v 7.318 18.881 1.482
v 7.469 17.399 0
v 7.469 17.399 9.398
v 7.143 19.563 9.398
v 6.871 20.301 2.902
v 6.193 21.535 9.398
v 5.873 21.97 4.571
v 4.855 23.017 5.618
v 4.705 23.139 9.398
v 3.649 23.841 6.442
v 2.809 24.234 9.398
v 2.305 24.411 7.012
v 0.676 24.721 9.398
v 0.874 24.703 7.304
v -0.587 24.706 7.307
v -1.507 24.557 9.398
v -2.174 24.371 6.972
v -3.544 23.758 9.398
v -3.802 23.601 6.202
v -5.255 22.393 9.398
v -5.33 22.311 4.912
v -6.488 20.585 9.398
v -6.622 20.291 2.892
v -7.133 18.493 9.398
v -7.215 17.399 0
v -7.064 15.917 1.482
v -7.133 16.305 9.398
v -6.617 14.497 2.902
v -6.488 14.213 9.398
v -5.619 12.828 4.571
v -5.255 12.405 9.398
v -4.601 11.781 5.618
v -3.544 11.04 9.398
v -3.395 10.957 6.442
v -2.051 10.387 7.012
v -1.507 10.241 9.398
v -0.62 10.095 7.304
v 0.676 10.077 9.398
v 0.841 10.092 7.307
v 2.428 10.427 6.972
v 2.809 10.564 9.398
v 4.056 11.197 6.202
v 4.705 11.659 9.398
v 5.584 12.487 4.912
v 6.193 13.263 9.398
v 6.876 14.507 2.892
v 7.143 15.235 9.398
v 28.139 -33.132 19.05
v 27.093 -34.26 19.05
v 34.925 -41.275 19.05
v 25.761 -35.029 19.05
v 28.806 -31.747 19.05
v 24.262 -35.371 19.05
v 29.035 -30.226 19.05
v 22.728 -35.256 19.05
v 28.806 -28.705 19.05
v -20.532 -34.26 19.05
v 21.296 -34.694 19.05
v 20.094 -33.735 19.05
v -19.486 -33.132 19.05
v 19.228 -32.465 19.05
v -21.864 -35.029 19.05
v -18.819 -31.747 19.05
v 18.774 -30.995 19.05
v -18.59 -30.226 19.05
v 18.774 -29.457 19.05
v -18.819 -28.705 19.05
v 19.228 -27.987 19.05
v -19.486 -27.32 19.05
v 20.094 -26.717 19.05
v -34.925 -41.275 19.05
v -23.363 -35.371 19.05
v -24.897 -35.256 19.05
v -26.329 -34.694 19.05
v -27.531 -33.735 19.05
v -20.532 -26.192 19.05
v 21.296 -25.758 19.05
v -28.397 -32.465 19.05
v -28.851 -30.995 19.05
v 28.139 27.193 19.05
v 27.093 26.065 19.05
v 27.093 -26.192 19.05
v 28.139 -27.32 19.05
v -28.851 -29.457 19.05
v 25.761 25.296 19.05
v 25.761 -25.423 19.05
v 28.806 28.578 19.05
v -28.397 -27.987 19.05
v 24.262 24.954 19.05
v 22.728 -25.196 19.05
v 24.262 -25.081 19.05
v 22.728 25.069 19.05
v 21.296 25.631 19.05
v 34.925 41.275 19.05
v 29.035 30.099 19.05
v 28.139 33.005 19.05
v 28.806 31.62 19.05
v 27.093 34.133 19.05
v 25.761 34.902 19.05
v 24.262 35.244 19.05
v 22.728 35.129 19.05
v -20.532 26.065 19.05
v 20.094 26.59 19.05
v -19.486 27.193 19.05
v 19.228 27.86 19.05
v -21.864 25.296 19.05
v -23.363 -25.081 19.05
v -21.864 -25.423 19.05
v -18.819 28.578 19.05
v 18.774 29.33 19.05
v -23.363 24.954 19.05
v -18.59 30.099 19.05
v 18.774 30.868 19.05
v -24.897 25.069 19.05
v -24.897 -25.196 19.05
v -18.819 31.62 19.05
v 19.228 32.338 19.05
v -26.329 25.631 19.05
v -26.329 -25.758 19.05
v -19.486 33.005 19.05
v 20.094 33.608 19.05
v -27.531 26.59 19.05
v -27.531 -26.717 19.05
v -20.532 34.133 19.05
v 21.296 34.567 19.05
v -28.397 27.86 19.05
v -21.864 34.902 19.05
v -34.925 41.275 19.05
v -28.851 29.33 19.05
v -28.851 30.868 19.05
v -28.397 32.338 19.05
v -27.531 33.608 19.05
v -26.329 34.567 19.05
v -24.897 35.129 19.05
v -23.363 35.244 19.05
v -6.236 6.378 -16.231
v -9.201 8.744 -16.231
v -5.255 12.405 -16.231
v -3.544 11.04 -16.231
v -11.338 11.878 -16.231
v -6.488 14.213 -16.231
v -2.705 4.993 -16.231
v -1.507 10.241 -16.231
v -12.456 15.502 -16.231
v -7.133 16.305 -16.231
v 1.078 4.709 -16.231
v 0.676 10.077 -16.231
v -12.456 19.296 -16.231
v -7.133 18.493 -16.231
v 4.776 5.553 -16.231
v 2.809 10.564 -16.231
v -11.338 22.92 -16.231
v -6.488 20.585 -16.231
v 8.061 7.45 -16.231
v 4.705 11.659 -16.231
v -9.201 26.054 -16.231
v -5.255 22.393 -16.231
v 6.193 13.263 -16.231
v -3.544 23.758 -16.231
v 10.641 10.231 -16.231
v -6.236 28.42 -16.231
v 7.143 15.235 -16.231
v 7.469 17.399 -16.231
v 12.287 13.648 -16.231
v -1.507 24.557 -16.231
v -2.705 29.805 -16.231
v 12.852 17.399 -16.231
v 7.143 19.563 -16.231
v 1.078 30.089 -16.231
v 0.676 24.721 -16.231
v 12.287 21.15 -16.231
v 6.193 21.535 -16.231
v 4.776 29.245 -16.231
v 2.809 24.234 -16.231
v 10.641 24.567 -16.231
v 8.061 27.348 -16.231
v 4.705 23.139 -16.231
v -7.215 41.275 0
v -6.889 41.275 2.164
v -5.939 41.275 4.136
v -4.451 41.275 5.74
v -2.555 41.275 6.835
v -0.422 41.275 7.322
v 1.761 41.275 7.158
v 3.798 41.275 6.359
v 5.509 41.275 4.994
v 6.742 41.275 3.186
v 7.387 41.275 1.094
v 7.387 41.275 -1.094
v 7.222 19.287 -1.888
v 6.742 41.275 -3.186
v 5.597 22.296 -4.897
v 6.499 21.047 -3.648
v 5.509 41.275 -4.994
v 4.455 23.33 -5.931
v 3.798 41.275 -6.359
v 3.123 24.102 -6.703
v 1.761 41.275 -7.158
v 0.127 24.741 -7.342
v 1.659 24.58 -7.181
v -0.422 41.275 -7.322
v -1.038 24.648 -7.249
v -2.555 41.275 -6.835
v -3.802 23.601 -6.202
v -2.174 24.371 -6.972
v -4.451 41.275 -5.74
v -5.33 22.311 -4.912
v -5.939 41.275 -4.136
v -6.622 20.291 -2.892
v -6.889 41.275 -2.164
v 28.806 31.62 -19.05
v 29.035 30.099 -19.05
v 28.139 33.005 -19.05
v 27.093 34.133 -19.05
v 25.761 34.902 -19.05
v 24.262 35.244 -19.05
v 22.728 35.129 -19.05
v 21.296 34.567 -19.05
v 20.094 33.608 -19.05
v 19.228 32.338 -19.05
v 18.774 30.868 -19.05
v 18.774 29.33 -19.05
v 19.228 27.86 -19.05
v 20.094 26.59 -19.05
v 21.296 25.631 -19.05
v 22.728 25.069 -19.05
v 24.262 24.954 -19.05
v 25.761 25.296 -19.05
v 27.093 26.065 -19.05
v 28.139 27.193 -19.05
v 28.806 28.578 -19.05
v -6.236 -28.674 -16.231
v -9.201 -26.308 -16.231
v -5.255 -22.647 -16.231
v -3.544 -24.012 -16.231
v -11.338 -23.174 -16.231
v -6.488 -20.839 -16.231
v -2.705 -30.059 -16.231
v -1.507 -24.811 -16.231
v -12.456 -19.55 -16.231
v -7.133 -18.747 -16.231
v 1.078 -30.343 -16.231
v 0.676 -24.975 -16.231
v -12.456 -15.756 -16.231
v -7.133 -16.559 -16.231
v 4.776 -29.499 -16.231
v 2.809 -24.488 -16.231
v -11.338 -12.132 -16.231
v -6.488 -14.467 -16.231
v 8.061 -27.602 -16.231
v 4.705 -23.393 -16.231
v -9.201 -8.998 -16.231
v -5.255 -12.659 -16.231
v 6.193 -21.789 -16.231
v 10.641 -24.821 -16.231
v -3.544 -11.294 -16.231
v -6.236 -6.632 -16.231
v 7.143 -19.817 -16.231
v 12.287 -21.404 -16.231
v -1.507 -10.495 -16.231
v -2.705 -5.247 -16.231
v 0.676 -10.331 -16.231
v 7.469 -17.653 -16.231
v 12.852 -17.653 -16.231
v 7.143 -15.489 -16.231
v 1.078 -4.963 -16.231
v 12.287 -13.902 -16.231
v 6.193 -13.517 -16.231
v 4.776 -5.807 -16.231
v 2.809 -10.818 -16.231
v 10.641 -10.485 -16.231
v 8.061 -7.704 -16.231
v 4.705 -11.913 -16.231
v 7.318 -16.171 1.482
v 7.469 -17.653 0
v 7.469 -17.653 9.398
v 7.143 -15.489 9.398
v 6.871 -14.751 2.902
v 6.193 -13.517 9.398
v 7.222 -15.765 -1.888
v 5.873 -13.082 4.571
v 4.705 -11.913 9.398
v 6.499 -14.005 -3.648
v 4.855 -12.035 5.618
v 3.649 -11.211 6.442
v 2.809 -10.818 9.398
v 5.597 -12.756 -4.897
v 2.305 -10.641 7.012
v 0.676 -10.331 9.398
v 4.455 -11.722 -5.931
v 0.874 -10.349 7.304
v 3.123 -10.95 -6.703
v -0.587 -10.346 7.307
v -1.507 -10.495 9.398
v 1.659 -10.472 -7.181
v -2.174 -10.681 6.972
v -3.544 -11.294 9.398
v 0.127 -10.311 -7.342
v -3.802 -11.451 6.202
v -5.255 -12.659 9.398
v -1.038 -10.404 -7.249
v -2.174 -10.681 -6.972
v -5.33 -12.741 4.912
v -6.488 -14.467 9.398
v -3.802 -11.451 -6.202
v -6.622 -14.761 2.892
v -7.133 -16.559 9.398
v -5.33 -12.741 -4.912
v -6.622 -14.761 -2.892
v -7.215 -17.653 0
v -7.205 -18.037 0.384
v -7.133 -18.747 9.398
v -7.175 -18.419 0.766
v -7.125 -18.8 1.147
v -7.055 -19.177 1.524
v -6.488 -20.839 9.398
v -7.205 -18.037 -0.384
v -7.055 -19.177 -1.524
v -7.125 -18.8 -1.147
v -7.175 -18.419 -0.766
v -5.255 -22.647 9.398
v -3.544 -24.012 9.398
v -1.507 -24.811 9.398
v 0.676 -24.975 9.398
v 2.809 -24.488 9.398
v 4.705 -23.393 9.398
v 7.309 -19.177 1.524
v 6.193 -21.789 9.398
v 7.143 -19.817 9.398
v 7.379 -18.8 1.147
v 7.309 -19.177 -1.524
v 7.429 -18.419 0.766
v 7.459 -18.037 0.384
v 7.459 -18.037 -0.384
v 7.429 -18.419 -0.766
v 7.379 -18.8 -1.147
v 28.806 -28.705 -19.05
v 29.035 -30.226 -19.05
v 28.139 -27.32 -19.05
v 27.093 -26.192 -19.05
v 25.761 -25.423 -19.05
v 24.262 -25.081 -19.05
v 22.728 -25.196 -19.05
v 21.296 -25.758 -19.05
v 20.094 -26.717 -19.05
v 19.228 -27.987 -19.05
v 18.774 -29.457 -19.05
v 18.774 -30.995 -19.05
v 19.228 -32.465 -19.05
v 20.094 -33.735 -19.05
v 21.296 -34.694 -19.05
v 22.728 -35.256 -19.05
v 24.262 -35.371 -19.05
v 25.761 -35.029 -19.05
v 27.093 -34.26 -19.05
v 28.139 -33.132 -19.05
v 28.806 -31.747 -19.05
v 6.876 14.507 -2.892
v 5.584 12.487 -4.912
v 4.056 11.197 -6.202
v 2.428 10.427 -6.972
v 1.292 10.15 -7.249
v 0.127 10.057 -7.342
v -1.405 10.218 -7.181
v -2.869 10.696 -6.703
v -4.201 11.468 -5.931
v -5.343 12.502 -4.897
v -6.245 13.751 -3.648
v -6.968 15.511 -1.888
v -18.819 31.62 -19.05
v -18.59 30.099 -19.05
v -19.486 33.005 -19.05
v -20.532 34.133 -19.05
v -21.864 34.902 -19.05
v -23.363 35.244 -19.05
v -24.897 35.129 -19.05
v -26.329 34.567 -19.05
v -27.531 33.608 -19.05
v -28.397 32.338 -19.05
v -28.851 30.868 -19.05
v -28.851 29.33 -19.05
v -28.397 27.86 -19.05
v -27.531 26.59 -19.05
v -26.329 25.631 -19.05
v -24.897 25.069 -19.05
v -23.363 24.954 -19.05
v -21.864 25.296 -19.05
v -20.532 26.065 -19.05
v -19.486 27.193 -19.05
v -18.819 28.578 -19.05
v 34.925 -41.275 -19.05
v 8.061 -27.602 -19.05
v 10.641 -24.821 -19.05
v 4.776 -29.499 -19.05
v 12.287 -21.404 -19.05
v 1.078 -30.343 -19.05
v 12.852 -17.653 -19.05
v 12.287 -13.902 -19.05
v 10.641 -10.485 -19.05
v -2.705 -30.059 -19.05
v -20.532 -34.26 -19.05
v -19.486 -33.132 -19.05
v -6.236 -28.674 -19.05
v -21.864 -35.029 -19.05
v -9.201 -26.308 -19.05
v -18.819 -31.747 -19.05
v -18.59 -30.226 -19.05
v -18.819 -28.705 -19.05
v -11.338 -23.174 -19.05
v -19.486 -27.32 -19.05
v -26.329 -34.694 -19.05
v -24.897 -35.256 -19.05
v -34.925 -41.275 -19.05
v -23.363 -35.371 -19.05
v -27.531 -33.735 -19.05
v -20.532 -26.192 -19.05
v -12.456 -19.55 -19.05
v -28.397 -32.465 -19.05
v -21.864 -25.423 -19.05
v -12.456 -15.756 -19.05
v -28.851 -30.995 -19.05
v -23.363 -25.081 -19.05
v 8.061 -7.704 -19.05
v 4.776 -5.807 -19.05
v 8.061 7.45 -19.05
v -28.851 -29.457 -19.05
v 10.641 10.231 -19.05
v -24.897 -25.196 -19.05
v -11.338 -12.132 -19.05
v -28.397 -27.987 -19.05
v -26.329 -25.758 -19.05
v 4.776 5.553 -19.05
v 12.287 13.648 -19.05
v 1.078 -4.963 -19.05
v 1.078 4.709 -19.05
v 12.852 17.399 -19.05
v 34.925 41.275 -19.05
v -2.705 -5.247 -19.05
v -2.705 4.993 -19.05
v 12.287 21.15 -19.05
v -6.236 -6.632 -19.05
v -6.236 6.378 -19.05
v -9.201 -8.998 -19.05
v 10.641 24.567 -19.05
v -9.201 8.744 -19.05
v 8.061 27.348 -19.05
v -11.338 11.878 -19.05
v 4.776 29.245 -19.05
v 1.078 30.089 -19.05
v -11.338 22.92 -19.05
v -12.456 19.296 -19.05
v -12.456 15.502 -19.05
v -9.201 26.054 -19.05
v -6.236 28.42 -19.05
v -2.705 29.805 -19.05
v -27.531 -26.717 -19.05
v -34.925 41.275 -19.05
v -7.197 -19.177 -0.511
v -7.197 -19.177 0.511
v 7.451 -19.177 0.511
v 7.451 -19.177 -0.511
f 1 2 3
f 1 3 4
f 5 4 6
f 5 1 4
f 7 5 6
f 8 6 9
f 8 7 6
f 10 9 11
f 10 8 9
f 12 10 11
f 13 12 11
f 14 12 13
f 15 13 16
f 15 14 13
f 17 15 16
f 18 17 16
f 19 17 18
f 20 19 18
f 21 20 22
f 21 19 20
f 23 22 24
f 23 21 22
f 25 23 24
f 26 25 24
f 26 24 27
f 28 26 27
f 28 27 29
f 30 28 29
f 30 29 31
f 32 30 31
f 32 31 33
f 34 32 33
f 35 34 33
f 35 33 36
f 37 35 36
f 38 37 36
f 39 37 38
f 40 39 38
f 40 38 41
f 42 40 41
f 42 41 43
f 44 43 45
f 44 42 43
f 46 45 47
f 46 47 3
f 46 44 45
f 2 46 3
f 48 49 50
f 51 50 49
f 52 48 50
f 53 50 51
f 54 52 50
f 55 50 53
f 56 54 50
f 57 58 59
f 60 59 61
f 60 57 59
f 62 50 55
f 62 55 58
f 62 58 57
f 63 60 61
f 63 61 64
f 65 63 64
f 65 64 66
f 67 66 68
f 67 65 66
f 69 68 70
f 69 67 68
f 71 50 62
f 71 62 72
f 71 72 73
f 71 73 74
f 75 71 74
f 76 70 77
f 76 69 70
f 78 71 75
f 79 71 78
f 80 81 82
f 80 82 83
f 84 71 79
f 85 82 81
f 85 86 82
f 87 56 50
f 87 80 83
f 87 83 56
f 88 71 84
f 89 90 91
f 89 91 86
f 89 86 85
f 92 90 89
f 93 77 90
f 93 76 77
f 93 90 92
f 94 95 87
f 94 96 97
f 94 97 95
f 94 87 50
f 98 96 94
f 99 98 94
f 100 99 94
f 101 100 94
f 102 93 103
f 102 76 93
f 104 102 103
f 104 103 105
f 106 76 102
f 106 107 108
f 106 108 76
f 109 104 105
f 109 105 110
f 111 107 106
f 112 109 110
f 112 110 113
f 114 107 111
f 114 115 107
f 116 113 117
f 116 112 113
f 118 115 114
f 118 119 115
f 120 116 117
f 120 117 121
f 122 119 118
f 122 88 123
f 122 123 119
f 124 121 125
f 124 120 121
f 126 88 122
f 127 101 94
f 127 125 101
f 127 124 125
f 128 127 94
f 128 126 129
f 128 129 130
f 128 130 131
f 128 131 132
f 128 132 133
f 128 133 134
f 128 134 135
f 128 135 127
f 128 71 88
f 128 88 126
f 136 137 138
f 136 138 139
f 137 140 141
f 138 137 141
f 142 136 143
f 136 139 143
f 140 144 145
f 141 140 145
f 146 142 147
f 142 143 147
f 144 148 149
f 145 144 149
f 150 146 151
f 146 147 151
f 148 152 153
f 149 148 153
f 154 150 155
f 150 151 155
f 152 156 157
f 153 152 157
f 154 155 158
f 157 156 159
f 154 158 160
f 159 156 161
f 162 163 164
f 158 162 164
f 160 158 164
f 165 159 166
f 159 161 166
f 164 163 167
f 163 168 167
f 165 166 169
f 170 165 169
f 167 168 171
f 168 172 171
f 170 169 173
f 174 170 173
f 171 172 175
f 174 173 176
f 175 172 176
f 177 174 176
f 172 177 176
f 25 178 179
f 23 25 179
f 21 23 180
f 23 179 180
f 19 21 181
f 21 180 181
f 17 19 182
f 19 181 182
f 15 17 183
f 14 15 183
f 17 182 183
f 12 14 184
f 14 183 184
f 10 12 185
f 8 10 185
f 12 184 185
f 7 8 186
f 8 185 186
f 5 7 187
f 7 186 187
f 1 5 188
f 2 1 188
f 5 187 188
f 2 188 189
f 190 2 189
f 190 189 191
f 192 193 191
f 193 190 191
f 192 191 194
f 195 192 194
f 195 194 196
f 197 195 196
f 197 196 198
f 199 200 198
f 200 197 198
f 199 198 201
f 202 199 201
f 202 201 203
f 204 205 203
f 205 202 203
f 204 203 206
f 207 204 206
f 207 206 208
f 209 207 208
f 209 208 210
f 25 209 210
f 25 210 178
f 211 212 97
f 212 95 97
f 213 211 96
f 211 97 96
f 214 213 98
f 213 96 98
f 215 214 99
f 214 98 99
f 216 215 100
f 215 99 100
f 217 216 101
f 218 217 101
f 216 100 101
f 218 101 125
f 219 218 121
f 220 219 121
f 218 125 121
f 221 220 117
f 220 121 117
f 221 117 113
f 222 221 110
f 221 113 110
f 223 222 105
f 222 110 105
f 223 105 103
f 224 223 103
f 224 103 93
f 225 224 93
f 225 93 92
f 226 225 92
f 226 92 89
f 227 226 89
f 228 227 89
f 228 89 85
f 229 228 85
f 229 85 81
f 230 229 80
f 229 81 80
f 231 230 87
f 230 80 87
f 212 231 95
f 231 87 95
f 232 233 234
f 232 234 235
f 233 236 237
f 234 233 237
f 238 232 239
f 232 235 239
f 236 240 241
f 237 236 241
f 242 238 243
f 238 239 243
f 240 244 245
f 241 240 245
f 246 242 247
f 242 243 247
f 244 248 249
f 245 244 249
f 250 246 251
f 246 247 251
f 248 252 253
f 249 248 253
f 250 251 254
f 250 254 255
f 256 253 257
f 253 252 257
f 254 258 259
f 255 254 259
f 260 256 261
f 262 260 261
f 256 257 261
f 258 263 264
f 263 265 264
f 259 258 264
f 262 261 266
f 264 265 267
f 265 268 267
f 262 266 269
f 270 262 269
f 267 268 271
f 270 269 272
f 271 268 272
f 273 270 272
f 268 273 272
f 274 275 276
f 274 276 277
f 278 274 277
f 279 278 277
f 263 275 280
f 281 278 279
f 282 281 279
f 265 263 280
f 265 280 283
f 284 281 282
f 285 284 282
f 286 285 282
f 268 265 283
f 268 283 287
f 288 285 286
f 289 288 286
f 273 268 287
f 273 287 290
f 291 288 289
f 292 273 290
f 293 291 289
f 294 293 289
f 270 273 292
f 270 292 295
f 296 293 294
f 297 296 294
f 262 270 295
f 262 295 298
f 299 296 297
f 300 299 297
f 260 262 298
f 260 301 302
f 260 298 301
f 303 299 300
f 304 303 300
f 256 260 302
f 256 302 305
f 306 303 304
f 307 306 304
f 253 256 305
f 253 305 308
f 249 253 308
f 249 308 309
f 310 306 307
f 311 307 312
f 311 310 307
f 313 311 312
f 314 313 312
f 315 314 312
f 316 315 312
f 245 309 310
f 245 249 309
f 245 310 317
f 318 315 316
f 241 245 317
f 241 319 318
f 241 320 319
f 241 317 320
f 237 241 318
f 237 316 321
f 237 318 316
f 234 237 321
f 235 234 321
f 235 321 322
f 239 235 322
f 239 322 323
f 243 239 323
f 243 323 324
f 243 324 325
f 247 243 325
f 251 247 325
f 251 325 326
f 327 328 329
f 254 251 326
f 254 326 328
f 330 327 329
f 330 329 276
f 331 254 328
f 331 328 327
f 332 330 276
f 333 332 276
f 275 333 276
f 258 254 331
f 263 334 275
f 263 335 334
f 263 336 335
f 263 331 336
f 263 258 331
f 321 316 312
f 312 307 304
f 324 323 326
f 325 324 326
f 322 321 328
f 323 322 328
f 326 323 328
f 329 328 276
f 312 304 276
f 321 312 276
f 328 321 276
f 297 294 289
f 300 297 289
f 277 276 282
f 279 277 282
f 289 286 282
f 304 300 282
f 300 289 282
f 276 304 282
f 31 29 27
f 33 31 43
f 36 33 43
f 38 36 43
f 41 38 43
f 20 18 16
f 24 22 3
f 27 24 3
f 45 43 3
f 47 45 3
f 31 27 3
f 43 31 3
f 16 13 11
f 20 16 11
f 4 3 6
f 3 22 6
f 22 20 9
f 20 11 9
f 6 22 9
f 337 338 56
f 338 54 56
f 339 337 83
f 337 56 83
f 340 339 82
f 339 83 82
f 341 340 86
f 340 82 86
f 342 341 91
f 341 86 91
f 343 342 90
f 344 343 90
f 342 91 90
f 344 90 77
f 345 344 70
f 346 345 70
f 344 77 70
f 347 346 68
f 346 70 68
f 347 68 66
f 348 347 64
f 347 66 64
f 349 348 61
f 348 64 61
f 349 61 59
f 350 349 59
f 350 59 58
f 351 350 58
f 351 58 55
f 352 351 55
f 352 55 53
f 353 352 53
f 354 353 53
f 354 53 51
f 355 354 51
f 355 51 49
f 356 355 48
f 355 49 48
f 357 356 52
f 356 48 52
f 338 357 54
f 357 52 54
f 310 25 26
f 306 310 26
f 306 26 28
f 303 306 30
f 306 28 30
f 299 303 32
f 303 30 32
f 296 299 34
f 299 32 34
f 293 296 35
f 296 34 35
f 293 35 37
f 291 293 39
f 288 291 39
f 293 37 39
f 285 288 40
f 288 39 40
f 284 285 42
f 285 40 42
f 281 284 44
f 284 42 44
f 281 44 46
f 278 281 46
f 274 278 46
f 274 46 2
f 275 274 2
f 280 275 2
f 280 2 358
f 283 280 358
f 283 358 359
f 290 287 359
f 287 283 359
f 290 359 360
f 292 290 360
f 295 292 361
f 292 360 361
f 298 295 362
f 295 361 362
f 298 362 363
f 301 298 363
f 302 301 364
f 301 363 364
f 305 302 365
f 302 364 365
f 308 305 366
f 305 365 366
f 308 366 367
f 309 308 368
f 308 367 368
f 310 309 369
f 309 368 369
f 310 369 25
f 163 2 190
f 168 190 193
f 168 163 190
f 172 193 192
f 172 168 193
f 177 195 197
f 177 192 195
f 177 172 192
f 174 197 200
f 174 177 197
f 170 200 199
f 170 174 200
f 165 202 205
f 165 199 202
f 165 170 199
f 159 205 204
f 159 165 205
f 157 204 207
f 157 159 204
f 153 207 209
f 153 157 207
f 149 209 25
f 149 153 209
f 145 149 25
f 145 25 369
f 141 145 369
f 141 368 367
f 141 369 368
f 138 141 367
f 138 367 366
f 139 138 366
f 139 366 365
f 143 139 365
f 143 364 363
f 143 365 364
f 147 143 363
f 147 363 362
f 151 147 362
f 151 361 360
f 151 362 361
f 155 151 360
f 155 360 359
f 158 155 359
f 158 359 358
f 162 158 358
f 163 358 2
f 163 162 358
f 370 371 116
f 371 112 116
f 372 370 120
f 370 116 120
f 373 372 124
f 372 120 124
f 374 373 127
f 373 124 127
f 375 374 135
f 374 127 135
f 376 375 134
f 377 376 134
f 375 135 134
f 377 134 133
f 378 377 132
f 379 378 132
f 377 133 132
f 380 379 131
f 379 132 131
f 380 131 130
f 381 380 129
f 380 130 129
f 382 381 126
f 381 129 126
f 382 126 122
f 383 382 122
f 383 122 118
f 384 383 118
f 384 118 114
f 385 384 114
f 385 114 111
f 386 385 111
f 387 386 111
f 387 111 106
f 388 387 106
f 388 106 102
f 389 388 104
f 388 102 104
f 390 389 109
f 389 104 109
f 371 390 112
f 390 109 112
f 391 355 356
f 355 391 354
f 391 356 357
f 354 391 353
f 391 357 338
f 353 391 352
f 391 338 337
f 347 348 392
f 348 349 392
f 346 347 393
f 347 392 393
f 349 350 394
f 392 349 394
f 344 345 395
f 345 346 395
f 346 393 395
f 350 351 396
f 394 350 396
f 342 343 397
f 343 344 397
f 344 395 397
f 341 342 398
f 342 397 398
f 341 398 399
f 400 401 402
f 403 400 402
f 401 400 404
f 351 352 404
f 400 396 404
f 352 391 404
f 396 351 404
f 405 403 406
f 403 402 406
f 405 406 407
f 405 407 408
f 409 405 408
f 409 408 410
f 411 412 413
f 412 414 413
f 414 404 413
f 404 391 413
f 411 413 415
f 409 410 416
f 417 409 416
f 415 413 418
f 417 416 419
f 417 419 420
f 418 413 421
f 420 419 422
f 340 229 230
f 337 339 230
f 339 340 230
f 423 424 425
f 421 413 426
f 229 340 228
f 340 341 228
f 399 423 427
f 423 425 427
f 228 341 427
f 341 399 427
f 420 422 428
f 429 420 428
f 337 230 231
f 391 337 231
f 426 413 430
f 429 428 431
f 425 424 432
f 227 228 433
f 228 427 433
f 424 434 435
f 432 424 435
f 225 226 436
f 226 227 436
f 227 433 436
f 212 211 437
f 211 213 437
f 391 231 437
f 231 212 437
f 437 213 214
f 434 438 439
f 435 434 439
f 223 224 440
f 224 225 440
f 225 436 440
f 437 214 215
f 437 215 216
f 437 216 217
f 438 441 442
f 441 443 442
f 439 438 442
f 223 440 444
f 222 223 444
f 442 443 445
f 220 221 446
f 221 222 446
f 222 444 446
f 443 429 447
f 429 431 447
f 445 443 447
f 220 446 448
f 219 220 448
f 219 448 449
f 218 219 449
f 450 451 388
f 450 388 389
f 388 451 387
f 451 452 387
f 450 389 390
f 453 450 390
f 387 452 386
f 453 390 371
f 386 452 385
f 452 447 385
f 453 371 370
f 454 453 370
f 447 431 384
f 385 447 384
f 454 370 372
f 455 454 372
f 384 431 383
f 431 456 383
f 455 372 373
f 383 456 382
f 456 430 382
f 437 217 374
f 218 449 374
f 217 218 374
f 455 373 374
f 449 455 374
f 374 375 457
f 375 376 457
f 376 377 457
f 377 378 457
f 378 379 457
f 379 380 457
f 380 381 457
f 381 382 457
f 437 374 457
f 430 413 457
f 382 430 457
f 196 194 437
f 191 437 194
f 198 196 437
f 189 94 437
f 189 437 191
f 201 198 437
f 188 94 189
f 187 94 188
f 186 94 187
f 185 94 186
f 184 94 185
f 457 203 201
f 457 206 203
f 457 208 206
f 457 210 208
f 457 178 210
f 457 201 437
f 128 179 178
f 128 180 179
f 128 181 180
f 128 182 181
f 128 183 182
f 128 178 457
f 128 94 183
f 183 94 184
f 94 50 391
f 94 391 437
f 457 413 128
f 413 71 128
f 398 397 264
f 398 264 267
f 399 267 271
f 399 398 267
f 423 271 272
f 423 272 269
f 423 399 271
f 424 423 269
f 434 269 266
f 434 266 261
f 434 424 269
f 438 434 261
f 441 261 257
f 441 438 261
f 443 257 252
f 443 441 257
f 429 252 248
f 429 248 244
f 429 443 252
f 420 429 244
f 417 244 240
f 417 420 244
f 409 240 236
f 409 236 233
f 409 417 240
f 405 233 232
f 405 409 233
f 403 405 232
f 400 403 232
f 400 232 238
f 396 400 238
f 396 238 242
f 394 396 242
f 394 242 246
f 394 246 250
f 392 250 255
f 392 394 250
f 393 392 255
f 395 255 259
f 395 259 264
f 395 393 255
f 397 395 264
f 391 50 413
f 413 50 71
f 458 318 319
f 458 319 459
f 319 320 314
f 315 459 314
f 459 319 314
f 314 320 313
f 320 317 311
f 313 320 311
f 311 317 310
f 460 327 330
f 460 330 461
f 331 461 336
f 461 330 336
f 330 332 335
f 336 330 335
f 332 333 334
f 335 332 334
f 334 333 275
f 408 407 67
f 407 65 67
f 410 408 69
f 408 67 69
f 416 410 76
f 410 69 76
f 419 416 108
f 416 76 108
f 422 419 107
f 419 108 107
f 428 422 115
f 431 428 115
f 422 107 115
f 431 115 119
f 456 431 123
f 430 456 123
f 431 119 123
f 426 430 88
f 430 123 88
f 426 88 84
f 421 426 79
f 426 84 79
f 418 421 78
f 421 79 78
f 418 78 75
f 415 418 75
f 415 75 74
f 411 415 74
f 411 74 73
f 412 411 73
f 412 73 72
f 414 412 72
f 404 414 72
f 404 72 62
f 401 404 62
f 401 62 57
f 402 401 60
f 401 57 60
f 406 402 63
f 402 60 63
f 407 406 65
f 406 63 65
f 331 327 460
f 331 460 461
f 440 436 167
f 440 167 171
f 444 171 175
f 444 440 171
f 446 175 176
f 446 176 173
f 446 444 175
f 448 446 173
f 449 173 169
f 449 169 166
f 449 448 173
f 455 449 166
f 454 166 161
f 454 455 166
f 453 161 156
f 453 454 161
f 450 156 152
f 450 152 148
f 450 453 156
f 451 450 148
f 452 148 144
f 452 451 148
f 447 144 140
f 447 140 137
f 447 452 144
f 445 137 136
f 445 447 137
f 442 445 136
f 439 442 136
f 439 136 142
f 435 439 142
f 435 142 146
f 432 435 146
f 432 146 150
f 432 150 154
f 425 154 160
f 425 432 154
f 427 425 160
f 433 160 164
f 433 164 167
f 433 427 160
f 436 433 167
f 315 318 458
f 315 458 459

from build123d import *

# Parameters (mm, degrees)
SKETCH1_W                   = 82.55
SKETCH1_H                   = 69.85
BOSS_EXTRUDE1_DEPTH         = 19.05
F_3_8_CLEARANCE_HOLE1_D     = 10.31875
F_3_8_CLEARANCE_HOLE1_DEPTH = 38.1
F_3_8_CLEARANCE_HOLE1_TIP   = 3.100065256
F_3_8_CLEARANCE_HOLE2_D     = 10.31875
F_3_8_CLEARANCE_HOLE2_DEPTH = 38.1
F_3_8_CLEARANCE_HOLE2_TIP   = 3.100065256
CUT_EXTRUDE2_START          = -19.05
SKETCH6_R                   = 7.3421875
CUT_EXTRUDE2_DEPTH          = 28.448
CUT_EXTRUDE4_START          = -19.05
SKETCH7_R                   = 12.7254
CUT_EXTRUDE4_DEPTH          = 2.8194
CUT_EXTRUDE6_START          = -19.05
SKETCH8_R                   = 7.3421875
CUT_EXTRUDE6_DEPTH          = 28.448
CUT_EXTRUDE8_START          = -19.05
SKETCH9_R                   = 12.7254
CUT_EXTRUDE8_DEPTH          = 2.8194
CUT_EXTRUDE10_START         = 41.275
SKETCH10_R                  = 7.3421875
CUT_EXTRUDE10_DEPTH         = 60.452


with BuildPart() as part:
    # Sketch1 → Boss-Extrude1 (new, symmetric)
    with BuildSketch(Plane(origin=(0, 0, 0), x_dir=(0, 1, 0), z_dir=(0, 0, 1))):
        Rectangle(SKETCH1_W, SKETCH1_H)
    extrude(amount=BOSS_EXTRUDE1_DEPTH, both=True)

    # 3/8 Clearance Hole1
    with Locations(Plane(origin=(0, 0, -19.05), x_dir=(-1, 0, 0), z_dir=(0, 0, -1))):
        with Locations((-23.876, -30.226)):
            Hole(F_3_8_CLEARANCE_HOLE1_D / 2, depth=F_3_8_CLEARANCE_HOLE1_DEPTH)
            with Locations((0, 0, -(F_3_8_CLEARANCE_HOLE1_DEPTH + F_3_8_CLEARANCE_HOLE1_TIP / 2))):  # 118° drill point
                Cone(0, F_3_8_CLEARANCE_HOLE1_D / 2, F_3_8_CLEARANCE_HOLE1_TIP, mode=Mode.SUBTRACT)

    # 3/8 Clearance Hole2
    with Locations(Plane(origin=(0, 0, -19.05), x_dir=(-1, 0, 0), z_dir=(0, 0, -1))):
        with Locations((-23.876, 30.099), (23.749, -30.226), (23.749, 30.099)):
            Hole(F_3_8_CLEARANCE_HOLE2_D / 2, depth=F_3_8_CLEARANCE_HOLE2_DEPTH)
            with Locations((0, 0, -(F_3_8_CLEARANCE_HOLE2_DEPTH + F_3_8_CLEARANCE_HOLE2_TIP / 2))):  # 118° drill point
                Cone(0, F_3_8_CLEARANCE_HOLE2_D / 2, F_3_8_CLEARANCE_HOLE2_TIP, mode=Mode.SUBTRACT)

    # Sketch6 → Cut-Extrude2 (cut)
    with BuildSketch(Plane(origin=(0, 0, 0), x_dir=(0, 1, 0), z_dir=(0, 0, 1)).offset(CUT_EXTRUDE2_START)):
        with Locations(Location((-17.653, -0.127, 0), (0, 0, 270))):
            Circle(SKETCH6_R)
    extrude(amount=CUT_EXTRUDE2_DEPTH, mode=Mode.SUBTRACT)

    # Sketch7 → Cut-Extrude4 (cut)
    with BuildSketch(Plane(origin=(0, 0, 0), x_dir=(0, 1, 0), z_dir=(0, 0, 1)).offset(CUT_EXTRUDE4_START)):
        with Locations(Location((-17.653, -0.127, 0), (0, 0, 270))):
            Circle(SKETCH7_R)
    extrude(amount=CUT_EXTRUDE4_DEPTH, mode=Mode.SUBTRACT)

    # Sketch8 → Cut-Extrude6 (cut)
    with BuildSketch(Plane(origin=(0, 0, 0), x_dir=(0, 1, 0), z_dir=(0, 0, 1)).offset(CUT_EXTRUDE6_START)):
        with Locations(Location((17.399, -0.127, 0), (0, 0, 270))):
            Circle(SKETCH8_R)
    extrude(amount=CUT_EXTRUDE6_DEPTH, mode=Mode.SUBTRACT)

    # Sketch9 → Cut-Extrude8 (cut)
    with BuildSketch(Plane(origin=(0, 0, 0), x_dir=(0, 1, 0), z_dir=(0, 0, 1)).offset(CUT_EXTRUDE8_START)):
        with Locations(Location((17.399, -0.127, 0), (0, 0, 270))):
            Circle(SKETCH9_R)
    extrude(amount=CUT_EXTRUDE8_DEPTH, mode=Mode.SUBTRACT)

    # Sketch10 → Cut-Extrude10 (cut)
    with BuildSketch(Plane(origin=(0, 0, 0), x_dir=(-1, 0, 0), z_dir=(0, 1, 0)).offset(CUT_EXTRUDE10_START)):
        with Locations((-0.127, 0)):
            Circle(SKETCH10_R)
    extrude(amount=-CUT_EXTRUDE10_DEPTH, mode=Mode.SUBTRACT)


solid = part.part
